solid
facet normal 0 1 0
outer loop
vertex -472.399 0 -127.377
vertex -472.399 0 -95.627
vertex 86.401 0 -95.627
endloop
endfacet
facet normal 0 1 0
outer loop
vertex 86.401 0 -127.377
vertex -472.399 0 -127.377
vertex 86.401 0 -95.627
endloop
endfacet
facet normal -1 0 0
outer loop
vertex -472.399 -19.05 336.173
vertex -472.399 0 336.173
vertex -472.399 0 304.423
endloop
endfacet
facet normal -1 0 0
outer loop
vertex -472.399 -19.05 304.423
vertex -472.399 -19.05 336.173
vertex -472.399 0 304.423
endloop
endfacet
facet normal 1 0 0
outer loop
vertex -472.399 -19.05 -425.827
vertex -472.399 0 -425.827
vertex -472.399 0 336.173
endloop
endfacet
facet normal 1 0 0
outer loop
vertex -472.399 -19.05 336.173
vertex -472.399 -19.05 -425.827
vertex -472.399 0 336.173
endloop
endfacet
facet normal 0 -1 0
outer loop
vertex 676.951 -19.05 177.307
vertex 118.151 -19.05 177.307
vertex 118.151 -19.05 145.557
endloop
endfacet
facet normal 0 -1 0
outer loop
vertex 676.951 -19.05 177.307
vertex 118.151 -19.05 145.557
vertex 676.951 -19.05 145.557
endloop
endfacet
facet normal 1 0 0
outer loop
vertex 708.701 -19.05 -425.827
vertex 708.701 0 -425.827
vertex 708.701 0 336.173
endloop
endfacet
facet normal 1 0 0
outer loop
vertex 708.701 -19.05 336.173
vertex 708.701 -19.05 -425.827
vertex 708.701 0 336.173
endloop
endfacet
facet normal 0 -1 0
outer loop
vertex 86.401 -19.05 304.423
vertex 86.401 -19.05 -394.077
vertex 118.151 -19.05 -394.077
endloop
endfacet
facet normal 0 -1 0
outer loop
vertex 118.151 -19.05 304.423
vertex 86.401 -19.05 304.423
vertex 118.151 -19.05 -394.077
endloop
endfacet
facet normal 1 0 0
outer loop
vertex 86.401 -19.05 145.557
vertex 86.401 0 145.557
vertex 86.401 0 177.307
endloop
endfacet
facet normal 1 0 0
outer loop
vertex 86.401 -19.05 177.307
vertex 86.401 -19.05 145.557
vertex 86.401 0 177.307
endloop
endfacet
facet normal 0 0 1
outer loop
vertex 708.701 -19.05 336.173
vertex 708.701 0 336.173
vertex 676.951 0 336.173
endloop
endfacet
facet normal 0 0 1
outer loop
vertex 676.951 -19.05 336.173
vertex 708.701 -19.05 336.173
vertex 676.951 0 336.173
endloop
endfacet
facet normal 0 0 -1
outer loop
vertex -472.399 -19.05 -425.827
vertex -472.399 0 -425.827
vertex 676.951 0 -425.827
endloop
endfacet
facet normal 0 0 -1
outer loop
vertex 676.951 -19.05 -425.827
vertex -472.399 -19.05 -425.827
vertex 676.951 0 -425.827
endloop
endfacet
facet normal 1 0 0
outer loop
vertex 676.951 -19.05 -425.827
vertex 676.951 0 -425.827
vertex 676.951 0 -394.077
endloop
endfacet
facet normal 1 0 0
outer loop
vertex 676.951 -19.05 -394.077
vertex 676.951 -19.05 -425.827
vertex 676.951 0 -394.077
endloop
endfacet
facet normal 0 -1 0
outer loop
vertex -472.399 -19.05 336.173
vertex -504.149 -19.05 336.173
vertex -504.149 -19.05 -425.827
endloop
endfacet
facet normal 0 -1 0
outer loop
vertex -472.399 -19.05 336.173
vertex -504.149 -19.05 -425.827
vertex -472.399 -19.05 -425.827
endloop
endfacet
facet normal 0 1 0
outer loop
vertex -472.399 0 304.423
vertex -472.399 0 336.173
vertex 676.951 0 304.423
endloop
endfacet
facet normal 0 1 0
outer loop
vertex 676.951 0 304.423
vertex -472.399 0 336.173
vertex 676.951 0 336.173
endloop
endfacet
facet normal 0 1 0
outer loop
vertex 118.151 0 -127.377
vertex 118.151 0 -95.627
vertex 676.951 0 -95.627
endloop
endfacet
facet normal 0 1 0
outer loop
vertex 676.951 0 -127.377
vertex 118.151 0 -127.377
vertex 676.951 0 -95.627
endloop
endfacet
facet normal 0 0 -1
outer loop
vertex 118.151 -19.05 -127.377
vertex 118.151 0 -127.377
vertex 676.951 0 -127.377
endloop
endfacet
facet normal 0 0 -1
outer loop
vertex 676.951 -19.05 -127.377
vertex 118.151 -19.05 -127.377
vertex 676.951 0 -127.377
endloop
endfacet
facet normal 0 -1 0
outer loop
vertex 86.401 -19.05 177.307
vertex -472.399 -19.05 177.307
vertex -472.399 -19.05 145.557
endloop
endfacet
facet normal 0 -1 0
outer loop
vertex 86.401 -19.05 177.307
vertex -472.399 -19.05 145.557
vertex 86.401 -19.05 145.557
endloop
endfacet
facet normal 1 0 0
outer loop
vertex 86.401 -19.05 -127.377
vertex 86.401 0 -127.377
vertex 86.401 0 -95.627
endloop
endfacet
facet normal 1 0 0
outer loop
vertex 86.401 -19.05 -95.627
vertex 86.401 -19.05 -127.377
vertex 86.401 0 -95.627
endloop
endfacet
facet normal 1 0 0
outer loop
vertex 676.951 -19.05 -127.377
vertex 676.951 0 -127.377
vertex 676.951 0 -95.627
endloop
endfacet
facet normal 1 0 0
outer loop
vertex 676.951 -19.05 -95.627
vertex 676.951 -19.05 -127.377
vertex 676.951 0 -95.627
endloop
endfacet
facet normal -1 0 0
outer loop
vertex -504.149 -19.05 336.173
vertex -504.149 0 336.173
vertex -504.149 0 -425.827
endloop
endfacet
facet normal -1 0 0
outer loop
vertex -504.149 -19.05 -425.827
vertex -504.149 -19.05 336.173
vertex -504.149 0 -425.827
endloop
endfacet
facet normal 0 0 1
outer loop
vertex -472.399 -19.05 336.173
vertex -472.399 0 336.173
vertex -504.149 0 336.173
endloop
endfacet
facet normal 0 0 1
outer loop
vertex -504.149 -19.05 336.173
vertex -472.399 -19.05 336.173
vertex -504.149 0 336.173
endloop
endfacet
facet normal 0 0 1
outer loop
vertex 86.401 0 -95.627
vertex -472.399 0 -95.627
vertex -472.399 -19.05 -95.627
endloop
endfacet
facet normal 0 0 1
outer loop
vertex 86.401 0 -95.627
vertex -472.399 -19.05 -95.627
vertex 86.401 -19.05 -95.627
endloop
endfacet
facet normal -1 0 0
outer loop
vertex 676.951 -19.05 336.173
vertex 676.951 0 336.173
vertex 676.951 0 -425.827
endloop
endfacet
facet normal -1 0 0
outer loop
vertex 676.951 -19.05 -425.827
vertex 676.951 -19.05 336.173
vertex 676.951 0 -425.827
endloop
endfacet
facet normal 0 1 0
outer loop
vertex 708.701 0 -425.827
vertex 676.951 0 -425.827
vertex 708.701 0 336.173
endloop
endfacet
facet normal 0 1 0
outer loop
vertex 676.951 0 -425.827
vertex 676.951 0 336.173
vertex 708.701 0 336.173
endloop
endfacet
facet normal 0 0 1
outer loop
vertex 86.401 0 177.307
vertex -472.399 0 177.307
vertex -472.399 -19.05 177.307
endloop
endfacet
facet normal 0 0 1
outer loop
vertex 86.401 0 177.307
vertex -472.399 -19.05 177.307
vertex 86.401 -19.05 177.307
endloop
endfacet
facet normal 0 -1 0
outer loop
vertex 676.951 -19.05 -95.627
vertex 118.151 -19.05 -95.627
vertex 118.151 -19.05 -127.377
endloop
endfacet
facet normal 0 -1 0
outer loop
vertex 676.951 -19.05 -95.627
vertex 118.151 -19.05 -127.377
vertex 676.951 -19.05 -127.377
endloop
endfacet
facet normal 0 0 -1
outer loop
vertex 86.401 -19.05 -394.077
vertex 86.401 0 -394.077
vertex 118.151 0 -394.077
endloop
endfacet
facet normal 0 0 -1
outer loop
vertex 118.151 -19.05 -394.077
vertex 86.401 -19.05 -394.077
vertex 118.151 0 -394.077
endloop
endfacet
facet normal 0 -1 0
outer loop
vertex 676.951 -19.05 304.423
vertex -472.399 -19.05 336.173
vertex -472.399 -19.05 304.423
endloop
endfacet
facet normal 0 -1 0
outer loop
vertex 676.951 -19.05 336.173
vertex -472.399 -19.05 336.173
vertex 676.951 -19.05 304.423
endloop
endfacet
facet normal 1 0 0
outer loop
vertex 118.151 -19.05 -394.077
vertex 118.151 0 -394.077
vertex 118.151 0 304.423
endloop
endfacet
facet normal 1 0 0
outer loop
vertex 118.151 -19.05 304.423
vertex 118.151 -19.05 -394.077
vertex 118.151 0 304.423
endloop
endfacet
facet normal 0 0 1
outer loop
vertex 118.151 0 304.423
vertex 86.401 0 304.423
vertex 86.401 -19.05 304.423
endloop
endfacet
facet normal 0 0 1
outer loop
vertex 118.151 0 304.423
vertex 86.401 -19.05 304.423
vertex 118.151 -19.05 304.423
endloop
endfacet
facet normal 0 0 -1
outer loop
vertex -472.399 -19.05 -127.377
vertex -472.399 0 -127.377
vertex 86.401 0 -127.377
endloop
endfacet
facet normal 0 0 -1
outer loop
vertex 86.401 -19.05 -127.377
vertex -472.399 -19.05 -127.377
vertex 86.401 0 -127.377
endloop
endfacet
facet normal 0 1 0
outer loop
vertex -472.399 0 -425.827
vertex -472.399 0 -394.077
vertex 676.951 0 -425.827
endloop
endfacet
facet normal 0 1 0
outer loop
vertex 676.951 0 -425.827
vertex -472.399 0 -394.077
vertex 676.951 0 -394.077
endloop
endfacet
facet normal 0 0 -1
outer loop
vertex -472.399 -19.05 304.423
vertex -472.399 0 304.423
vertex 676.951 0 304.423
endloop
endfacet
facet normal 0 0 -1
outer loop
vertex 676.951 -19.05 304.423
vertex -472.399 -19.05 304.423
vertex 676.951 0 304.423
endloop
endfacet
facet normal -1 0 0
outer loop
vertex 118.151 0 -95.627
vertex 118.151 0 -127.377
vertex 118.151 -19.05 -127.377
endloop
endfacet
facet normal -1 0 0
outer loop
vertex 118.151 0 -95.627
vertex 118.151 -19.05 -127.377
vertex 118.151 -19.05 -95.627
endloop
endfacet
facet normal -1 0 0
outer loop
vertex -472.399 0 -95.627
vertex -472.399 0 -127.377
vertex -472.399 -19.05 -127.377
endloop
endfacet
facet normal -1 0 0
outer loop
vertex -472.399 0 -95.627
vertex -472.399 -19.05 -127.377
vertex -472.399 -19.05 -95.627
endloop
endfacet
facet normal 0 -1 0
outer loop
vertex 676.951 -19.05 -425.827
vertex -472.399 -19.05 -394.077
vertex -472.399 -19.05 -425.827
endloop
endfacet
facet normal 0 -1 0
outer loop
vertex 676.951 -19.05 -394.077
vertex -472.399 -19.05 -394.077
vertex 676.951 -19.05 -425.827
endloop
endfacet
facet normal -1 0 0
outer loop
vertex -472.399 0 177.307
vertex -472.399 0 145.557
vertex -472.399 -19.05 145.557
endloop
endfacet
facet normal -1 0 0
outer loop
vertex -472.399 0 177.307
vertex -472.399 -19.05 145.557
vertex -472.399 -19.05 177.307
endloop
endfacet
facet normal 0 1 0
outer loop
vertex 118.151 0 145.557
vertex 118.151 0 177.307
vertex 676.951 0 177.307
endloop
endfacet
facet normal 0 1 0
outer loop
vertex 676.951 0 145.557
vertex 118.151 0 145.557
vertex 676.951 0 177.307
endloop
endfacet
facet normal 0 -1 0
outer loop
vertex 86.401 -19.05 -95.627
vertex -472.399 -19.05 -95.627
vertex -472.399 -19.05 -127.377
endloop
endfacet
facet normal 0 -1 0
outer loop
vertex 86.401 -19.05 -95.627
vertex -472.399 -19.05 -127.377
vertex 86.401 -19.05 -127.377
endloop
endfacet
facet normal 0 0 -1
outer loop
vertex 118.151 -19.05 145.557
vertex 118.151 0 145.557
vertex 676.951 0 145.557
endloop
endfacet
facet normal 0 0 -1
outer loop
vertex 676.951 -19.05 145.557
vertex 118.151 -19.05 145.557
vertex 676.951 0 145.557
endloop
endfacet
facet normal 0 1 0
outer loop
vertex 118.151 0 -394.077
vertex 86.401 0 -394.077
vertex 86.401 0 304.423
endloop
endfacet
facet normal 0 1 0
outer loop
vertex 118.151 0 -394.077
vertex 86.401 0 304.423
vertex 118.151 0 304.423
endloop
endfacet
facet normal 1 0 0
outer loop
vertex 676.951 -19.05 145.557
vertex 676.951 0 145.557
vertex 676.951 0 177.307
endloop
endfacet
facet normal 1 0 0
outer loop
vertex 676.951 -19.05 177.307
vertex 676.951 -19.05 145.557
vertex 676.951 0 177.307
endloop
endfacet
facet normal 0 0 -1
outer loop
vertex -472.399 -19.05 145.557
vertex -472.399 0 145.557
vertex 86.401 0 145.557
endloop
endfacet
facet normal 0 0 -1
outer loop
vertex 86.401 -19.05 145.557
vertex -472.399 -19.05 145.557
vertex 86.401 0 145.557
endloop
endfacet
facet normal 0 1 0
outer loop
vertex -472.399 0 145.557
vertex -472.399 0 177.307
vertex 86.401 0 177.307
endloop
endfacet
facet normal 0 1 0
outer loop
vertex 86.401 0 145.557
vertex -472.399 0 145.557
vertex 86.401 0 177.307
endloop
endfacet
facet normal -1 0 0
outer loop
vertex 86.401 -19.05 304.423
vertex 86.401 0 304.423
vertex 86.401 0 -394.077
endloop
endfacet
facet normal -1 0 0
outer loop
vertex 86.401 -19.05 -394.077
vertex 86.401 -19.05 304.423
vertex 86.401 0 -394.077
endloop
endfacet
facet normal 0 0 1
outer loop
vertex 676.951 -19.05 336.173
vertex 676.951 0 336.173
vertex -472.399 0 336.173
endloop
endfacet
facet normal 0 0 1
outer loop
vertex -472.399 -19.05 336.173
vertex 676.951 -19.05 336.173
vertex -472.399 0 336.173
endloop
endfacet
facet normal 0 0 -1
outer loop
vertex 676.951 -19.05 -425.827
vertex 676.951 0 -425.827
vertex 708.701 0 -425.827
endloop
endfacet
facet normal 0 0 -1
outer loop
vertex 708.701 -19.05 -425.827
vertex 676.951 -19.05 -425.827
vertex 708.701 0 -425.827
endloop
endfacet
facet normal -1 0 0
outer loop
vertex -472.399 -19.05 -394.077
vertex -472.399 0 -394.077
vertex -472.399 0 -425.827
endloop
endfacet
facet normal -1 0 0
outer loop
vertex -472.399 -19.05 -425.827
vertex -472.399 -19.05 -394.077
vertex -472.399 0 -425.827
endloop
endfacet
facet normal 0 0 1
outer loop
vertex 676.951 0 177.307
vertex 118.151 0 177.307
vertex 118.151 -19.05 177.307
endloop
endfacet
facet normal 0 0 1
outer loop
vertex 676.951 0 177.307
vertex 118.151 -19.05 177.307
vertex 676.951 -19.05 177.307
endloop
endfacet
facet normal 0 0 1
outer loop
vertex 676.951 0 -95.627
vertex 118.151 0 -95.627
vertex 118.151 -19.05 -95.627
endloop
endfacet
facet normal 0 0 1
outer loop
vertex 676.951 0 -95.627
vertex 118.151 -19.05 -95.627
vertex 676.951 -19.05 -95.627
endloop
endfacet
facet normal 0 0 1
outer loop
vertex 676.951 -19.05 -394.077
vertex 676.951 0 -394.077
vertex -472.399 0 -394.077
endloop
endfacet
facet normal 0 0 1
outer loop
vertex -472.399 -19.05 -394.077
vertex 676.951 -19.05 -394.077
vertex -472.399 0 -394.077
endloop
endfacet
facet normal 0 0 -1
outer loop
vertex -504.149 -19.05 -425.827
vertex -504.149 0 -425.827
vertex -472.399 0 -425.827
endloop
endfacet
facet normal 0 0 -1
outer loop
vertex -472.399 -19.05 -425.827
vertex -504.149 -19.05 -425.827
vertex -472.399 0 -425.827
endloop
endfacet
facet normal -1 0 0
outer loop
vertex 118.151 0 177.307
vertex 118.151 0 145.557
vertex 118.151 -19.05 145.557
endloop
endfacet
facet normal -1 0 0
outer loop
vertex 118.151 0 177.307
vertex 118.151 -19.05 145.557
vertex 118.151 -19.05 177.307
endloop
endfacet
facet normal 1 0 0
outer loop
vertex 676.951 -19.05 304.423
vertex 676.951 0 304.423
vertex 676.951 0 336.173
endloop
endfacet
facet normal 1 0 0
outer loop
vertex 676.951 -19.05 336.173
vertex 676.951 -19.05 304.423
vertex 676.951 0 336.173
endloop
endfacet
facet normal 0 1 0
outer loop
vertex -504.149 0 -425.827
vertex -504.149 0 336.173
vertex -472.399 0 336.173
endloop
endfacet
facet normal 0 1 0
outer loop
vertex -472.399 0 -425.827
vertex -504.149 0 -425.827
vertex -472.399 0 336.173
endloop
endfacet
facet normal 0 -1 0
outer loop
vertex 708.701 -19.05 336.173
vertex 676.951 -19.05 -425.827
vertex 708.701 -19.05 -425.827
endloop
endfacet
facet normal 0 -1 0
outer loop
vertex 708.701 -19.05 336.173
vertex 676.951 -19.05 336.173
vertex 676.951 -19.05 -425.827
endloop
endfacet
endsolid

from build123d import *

# Parameters (mm, degrees)
F1_DEPTH = 19.05
F0_W     = 31.75
F0_H     = 241.1844468117
F0_H_2   = 31.75
F0_H_3   = 127.1155531883
F0_H_4   = 266.7
F2_DEPTH = 19.05
F0_W_2   = 558.8


with BuildPart() as f1:
    # F0 (on Front) → F1 (new body)
    with BuildSketch(Plane.XZ):
        Polygon((-504.1488654983, 336.173041563), (-504.1488654983, -425.826958437), (-472.3988654983, -425.826958437), (-472.3988654983, -394.076958437), (-472.3988654983, -127.376958437), (-472.3988654983, -95.626958437), (-472.3988654983, 145.5574883747), (-472.3988654983, 177.3074883747), (-472.3988654983, 304.423041563), (-472.3988654983, 336.173041563), align=None)
    extrude(amount=F1_DEPTH)


with BuildPart() as f1b:
    # F0 (on Front) → F1, piece 2 (new body)
    with BuildSketch(Plane.XZ):
        with Locations((102.2761345017, 24.9652649688)):
            Rectangle(F0_W, F0_H)
        with Locations((102.2761345017, 161.4324883747)):
            Rectangle(F0_W, F0_H_2)
        with Locations((102.2761345017, 240.8652649688)):
            Rectangle(F0_W, F0_H_3)
        with Locations((102.2761345017, -260.726958437)):
            Rectangle(F0_W, F0_H_4)
        with Locations((102.2761345017, -111.501958437)):
            Rectangle(F0_W, F0_H_2)
    extrude(amount=F1_DEPTH)


with BuildPart() as f1c:
    # F0 (on Front) → F1, piece 3 (new body)
    with BuildSketch(Plane.XZ):
        Polygon((676.9511345017, -394.076958437), (676.9511345017, -425.826958437), (708.7011345017, -425.826958437), (708.7011345017, 336.173041563), (676.9511345017, 336.173041563), (676.9511345017, 304.423041563), (676.9511345017, 177.3074883747), (676.9511345017, 145.5574883747), (676.9511345017, -95.626958437), (676.9511345017, -127.376958437), align=None)
    extrude(amount=F1_DEPTH)


with BuildPart() as f2:
    # F0 (on Front) → F2 (new body)
    with BuildSketch(Plane.XZ):
        Polygon((676.9511345017, 336.173041563), (-472.3988654983, 336.173041563), (-472.3988654983, 304.423041563), (86.4011345017, 304.423041563), (118.1511345017, 304.423041563), (676.9511345017, 304.423041563), align=None)
    extrude(amount=F2_DEPTH)


with BuildPart() as f2b:
    # F0 (on Front) → F2, piece 2 (new body)
    with BuildSketch(Plane.XZ):
        with Locations((-192.9988654983, 161.4324883747)):
            Rectangle(F0_W_2, F0_H_2)
    extrude(amount=F2_DEPTH)


with BuildPart() as f2c:
    # F0 (on Front) → F2, piece 3 (new body)
    with BuildSketch(Plane.XZ):
        with Locations((-192.9988654983, -111.501958437)):
            Rectangle(F0_W_2, F0_H_2)
    extrude(amount=F2_DEPTH)


with BuildPart() as f2d:
    # F0 (on Front) → F2, piece 4 (new body)
    with BuildSketch(Plane.XZ):
        Polygon((-472.3988654983, -394.076958437), (-472.3988654983, -425.826958437), (676.9511345017, -425.826958437), (676.9511345017, -394.076958437), (118.1511345017, -394.076958437), (86.4011345017, -394.076958437), align=None)
    extrude(amount=F2_DEPTH)


with BuildPart() as f2e:
    # F0 (on Front) → F2, piece 5 (new body)
    with BuildSketch(Plane.XZ):
        with Locations((397.5511345017, -111.501958437)):
            Rectangle(F0_W_2, F0_H_2)
    extrude(amount=F2_DEPTH)


with BuildPart() as f2f:
    # F0 (on Front) → F2, piece 6 (new body)
    with BuildSketch(Plane.XZ):
        with Locations((397.5511345017, 161.4324883747)):
            Rectangle(F0_W_2, F0_H_2)
    extrude(amount=F2_DEPTH)


solid = Compound([f1.part, f1b.part, f1c.part, f2.part, f2b.part, f2c.part, f2d.part, f2e.part, f2f.part])
